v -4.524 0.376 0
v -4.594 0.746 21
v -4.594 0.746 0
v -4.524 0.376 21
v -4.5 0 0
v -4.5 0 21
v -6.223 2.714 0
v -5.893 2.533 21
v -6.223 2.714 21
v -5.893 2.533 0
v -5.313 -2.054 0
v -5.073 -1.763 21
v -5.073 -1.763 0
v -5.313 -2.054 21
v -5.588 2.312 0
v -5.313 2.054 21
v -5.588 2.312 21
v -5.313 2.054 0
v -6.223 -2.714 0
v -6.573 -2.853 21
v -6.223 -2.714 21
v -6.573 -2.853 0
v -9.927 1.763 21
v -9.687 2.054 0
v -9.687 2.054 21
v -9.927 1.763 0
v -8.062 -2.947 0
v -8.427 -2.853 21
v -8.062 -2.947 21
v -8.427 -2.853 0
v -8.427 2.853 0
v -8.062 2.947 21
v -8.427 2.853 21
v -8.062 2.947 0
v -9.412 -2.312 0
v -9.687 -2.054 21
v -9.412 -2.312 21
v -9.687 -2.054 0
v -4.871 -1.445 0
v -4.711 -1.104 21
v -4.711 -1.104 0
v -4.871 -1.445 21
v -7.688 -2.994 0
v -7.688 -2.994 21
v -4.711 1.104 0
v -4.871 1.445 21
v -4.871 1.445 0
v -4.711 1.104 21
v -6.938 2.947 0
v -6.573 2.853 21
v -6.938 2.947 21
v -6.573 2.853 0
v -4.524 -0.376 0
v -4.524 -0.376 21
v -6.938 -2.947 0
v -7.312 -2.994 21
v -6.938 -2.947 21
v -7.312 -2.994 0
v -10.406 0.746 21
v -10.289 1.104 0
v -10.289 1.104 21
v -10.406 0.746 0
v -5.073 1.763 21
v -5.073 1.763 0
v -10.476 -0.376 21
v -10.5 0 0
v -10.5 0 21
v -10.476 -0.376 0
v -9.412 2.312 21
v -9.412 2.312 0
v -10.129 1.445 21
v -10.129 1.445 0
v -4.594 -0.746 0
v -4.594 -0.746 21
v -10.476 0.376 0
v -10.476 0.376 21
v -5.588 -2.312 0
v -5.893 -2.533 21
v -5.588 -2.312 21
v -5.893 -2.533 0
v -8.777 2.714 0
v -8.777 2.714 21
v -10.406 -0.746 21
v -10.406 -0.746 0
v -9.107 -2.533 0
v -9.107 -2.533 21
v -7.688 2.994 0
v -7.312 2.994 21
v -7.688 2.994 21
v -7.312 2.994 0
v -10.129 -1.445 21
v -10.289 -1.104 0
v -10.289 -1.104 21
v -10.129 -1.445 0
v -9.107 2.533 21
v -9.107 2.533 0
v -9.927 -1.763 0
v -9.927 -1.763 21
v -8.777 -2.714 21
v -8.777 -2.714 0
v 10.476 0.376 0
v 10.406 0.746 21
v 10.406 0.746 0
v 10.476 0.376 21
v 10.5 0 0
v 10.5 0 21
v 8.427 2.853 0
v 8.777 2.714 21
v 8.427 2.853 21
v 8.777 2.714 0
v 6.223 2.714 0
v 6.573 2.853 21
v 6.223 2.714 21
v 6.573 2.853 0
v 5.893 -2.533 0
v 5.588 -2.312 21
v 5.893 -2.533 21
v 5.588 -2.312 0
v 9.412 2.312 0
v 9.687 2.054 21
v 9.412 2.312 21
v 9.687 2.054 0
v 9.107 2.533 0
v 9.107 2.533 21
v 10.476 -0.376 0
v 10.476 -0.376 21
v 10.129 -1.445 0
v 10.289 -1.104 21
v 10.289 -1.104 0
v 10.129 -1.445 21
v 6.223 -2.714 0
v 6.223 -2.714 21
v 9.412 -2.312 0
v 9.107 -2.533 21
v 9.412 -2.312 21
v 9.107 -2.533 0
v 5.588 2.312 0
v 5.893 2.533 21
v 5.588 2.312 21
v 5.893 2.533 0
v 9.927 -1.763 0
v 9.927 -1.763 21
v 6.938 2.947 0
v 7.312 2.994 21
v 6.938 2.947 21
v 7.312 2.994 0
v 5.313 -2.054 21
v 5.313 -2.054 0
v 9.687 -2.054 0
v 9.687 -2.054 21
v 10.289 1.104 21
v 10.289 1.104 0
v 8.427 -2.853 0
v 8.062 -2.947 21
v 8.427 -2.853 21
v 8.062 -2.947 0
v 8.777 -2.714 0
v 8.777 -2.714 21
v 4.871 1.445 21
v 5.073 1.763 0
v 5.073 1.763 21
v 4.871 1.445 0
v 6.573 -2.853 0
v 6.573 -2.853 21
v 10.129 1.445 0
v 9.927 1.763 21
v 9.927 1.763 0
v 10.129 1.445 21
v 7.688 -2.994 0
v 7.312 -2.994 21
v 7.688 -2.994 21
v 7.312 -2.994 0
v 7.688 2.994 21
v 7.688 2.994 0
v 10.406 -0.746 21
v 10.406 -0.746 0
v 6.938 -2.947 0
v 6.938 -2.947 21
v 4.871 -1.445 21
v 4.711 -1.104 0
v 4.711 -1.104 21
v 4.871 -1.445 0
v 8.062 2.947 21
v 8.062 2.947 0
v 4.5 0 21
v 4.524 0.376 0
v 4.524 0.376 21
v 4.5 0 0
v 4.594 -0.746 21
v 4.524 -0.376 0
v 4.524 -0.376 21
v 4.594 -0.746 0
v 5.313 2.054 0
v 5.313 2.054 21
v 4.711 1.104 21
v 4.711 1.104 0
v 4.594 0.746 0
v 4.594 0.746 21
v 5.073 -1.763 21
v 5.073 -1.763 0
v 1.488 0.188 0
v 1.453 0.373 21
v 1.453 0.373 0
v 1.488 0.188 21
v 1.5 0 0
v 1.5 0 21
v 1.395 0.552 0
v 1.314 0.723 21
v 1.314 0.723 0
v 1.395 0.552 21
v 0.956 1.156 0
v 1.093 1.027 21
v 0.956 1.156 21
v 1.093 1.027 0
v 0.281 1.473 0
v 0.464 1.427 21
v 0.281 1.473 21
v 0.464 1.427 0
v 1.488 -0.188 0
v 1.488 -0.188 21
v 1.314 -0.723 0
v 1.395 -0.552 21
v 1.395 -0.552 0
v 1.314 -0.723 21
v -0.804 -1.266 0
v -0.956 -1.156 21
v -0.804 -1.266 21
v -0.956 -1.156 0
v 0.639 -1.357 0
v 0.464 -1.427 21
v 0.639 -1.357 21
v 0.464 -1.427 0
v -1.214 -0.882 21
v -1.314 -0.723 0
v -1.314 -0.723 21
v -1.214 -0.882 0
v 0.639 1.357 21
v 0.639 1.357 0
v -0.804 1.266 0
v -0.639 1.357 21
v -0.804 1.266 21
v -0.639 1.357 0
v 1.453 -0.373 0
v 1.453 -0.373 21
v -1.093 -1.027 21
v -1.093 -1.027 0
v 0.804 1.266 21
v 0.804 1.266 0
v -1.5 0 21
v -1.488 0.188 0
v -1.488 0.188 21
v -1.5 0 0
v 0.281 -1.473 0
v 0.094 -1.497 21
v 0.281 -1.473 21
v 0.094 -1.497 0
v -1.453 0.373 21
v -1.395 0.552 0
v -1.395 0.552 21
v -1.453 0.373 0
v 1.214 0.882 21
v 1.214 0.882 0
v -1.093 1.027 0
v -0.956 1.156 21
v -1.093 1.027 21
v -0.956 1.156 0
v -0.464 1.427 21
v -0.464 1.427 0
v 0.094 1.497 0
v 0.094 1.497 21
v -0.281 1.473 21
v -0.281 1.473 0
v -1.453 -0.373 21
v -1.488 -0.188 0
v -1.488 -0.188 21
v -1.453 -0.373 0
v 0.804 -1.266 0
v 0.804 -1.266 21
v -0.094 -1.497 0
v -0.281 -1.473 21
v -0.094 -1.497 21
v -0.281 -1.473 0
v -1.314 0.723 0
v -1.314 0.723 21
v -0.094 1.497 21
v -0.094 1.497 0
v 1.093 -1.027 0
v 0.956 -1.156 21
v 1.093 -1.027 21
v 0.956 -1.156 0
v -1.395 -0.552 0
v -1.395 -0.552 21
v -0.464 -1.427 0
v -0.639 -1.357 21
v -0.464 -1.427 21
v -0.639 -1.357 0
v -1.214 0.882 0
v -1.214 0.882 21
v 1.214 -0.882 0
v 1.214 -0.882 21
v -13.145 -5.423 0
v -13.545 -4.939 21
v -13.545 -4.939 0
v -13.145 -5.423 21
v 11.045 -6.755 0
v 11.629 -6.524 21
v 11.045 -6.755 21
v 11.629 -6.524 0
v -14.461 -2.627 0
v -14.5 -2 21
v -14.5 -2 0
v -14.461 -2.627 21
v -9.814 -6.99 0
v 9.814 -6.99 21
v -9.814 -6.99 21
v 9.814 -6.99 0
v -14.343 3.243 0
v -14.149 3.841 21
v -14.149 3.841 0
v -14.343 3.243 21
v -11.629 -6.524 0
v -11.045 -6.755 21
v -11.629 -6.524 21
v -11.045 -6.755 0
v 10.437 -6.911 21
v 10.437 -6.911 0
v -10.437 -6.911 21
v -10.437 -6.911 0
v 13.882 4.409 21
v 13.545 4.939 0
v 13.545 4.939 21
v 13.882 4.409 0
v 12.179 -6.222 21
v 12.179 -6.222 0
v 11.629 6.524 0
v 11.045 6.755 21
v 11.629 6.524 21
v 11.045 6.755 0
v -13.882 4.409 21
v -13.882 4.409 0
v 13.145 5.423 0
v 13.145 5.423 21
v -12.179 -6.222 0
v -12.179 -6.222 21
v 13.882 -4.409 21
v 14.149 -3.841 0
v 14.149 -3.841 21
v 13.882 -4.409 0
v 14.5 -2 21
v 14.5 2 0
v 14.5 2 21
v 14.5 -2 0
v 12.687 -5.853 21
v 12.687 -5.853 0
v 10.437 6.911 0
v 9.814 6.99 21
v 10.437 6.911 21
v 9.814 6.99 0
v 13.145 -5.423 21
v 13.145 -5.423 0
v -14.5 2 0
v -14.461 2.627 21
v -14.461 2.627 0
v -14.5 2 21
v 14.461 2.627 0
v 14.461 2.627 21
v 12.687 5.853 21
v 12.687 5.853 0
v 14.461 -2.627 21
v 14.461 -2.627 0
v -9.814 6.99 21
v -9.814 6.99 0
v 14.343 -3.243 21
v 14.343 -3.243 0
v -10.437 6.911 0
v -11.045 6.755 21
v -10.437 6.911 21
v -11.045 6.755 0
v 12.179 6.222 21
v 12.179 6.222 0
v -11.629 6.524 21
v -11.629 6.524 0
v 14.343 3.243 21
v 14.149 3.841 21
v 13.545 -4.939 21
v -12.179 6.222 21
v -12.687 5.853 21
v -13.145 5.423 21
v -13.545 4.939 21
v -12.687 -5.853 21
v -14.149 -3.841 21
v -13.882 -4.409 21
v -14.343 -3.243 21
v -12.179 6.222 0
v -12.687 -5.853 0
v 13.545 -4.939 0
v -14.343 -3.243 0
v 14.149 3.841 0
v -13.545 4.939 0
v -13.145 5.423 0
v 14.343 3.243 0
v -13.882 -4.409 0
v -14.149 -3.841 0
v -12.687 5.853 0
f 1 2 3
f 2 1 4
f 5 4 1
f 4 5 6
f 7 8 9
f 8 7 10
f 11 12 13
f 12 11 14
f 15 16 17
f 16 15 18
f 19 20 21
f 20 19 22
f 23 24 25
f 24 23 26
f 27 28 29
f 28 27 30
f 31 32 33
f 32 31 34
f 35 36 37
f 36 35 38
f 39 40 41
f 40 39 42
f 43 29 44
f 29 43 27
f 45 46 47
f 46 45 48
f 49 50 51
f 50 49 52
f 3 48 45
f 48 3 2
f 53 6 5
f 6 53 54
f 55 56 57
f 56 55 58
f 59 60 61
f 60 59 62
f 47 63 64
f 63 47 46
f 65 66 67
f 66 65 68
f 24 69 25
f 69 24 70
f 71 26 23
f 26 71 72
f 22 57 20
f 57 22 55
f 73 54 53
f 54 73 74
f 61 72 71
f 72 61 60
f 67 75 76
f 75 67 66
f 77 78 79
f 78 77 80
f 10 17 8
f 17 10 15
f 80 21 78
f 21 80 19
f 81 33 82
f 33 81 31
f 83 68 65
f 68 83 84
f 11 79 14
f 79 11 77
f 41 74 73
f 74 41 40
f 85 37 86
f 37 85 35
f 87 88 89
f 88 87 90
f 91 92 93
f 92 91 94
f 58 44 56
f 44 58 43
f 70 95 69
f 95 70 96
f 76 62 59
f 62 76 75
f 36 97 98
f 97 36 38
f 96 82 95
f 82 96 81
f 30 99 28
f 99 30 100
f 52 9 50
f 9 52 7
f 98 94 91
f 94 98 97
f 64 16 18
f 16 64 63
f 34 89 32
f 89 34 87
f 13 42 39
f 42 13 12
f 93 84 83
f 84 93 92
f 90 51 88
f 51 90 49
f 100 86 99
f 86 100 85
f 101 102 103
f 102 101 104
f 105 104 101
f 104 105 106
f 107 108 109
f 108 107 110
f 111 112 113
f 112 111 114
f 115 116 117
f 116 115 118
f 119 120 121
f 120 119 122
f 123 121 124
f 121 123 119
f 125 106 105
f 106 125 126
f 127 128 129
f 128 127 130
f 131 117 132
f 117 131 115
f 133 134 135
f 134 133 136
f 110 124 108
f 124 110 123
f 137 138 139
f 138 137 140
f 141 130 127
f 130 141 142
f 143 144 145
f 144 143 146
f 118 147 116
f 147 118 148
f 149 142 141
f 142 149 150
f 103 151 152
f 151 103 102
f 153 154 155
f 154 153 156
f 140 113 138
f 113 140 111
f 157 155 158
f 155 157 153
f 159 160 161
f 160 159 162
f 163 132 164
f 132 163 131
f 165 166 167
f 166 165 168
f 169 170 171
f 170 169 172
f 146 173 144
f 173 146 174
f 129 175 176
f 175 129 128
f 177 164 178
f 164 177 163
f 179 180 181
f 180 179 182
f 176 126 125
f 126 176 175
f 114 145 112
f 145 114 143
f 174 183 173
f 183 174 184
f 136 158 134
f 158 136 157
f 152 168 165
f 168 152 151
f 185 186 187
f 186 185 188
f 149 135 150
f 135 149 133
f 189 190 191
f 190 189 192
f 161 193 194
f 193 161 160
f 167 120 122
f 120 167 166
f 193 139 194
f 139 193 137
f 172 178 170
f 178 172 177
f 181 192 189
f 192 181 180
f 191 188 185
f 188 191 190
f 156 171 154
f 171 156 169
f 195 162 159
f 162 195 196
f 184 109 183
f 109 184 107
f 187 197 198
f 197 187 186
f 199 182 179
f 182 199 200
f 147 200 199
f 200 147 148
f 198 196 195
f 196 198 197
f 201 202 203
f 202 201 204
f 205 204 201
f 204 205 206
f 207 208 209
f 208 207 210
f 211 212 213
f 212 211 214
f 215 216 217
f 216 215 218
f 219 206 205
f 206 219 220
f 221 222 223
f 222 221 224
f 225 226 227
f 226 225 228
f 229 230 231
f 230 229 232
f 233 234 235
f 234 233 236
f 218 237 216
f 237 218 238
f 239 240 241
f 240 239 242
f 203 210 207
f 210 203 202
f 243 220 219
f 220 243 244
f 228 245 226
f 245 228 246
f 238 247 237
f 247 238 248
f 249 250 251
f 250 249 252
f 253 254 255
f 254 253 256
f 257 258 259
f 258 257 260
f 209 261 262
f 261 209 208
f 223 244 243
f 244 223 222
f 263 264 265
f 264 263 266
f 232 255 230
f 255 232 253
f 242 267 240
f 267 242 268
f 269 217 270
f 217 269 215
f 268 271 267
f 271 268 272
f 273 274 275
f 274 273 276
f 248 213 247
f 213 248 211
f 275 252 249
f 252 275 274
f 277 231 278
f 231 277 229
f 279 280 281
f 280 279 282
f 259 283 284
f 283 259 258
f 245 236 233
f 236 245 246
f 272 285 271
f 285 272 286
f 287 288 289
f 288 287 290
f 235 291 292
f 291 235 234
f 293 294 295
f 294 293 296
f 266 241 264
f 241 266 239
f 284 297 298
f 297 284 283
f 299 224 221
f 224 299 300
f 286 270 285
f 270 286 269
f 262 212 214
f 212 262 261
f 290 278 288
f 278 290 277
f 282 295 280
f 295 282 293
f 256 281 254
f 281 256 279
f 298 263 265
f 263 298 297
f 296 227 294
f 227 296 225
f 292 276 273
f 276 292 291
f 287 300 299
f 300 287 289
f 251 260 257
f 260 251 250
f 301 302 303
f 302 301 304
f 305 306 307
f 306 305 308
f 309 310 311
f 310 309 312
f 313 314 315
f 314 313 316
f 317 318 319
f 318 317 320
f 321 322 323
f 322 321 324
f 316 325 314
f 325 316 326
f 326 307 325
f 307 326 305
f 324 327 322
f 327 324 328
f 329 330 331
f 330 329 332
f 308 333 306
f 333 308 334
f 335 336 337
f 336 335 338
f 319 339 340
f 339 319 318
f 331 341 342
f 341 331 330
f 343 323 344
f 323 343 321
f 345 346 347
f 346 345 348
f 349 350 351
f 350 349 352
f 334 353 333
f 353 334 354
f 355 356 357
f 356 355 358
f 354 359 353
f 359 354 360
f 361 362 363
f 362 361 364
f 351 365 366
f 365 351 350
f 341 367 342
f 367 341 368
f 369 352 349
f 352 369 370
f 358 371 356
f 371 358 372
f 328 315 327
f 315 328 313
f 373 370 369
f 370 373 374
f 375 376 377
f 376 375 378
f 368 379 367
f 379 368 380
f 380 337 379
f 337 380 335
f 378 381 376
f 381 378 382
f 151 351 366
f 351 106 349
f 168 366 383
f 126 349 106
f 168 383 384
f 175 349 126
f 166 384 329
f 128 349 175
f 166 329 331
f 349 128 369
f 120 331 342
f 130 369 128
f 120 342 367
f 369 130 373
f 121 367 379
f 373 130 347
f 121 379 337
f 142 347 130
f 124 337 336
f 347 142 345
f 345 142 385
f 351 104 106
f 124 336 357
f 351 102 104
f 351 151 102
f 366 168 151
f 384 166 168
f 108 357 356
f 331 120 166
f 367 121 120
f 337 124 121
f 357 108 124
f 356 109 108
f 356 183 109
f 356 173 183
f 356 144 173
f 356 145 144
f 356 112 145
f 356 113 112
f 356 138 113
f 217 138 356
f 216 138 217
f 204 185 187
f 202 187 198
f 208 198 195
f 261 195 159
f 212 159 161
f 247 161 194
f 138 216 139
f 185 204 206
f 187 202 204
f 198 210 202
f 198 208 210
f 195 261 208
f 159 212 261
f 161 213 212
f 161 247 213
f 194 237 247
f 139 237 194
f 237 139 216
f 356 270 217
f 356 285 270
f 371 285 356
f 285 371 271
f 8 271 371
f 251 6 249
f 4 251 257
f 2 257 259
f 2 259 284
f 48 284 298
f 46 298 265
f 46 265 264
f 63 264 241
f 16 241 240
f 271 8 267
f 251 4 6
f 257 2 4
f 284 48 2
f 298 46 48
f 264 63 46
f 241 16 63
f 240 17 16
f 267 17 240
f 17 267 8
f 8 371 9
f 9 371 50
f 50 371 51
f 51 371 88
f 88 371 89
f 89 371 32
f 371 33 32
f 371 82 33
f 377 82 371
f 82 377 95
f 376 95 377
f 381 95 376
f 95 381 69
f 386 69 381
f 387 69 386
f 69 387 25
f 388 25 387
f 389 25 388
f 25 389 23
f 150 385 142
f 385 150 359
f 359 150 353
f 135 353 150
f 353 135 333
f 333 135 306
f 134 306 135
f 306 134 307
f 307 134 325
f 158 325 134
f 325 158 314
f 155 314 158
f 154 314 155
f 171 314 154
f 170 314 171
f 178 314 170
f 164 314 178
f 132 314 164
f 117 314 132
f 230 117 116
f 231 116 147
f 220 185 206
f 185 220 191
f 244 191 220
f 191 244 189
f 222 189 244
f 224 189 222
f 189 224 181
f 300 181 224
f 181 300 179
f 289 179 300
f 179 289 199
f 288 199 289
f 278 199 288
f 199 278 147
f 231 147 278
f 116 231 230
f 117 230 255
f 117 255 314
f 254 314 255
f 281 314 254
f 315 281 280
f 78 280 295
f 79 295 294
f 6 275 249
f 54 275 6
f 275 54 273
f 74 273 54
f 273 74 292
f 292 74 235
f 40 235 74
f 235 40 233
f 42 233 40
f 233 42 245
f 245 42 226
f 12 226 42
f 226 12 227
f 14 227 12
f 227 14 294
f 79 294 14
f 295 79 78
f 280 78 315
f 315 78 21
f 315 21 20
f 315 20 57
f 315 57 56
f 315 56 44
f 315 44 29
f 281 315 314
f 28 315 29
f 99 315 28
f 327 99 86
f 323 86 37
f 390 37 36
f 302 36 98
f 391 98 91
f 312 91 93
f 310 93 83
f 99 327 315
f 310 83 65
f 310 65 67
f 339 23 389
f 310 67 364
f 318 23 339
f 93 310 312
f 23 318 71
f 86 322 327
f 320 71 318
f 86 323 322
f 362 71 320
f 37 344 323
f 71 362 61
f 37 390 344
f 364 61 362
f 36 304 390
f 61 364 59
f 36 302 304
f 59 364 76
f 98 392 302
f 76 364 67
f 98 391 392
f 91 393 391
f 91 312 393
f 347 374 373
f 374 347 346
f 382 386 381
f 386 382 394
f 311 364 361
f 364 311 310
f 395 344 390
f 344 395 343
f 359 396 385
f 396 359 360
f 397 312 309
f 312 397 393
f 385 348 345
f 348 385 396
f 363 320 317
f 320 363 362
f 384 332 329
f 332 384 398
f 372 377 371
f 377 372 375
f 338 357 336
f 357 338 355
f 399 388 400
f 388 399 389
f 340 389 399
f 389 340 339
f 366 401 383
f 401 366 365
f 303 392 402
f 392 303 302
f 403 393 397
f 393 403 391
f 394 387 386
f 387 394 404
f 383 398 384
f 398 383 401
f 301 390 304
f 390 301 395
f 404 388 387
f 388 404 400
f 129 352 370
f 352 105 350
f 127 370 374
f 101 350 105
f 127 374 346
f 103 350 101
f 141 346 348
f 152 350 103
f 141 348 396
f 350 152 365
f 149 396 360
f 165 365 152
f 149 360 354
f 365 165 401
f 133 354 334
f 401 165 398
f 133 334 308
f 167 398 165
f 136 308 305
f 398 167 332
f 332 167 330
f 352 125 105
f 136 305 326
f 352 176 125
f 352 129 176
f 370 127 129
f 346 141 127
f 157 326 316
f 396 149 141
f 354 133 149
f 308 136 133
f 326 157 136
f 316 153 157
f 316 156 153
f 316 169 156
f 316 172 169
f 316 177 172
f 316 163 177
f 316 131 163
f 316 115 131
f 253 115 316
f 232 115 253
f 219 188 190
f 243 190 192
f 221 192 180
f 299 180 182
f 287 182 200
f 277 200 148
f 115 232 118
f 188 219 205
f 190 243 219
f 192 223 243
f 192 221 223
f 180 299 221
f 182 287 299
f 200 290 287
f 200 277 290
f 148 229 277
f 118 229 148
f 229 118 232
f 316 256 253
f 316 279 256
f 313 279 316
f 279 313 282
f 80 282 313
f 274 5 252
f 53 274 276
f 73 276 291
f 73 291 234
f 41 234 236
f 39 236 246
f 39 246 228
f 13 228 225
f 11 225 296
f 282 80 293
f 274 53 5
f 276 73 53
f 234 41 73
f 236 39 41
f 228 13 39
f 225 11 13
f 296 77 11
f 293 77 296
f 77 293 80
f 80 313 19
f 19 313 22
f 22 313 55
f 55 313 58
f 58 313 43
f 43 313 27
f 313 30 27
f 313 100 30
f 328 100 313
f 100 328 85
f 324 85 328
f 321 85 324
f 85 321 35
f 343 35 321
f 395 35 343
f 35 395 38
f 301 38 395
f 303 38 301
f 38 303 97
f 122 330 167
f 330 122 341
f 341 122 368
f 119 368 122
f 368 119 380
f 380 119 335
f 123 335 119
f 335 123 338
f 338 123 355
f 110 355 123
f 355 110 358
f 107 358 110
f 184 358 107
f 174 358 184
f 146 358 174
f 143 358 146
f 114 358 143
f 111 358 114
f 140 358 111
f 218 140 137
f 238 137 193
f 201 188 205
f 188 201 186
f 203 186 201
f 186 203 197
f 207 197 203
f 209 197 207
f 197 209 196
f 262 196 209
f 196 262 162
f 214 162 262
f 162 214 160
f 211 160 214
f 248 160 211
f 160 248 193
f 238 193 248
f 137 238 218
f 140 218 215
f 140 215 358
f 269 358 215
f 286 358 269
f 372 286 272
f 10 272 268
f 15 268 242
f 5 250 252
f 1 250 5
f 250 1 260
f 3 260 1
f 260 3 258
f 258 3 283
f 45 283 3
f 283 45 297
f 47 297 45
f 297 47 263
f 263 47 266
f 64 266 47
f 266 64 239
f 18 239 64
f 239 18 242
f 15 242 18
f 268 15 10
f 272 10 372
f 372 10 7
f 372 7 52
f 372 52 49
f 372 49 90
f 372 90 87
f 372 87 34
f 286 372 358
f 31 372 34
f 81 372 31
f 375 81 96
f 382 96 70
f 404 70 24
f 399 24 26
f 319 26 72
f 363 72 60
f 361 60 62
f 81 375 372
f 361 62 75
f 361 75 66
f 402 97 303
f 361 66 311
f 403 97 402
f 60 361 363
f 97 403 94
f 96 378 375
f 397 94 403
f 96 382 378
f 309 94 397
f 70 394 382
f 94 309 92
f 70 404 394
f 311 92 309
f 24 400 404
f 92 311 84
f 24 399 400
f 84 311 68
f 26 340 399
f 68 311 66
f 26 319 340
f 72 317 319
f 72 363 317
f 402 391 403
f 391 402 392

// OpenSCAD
$fn = 50;


difference() {
	union() {
		*color(alpha = 1.0000000000, c = "gray") {
			translate(v = [0, 7, 0]) {
				linear_extrude(height = 1) {
					text(font = "Arial:style=Bold", halign = "center", size = 4.5000000000, text = "COMMENT plate main", valign = "center");
				}
			}
		}
		hull() {
			translate(v = [-9.5000000000, 2.0000000000, 0]) {
				cylinder(h = 21, r = 5);
			}
			translate(v = [9.5000000000, 2.0000000000, 0]) {
				cylinder(h = 21, r = 5);
			}
			translate(v = [-9.5000000000, -2.0000000000, 0]) {
				cylinder(h = 21, r = 5);
			}
			translate(v = [9.5000000000, -2.0000000000, 0]) {
				cylinder(h = 21, r = 5);
			}
		}
	}
	union() {
		*color(alpha = 1.0000000000, c = "gray") {
			translate(v = [0, 7, 0]) {
				linear_extrude(height = 1) {
					text(font = "Arial:style=Bold", halign = "center", size = 4.5000000000, text = "COMMENT holes main", valign = "center");
				}
			}
		}
		translate(v = [-7.5000000000, 0.0000000000, 0]) {
			translate(v = [0, 0, -100]) {
				cylinder(h = 200, r = 3.0000000000);
			}
		}
		translate(v = [7.5000000000, 0.0000000000, 0]) {
			translate(v = [0, 0, -100]) {
				cylinder(h = 200, r = 3.0000000000);
			}
		}
		translate(v = [-7.5000000000, 0.0000000000, 0]) {
			translate(v = [0, 0, -100]) {
				cylinder(h = 200, r = 1.5000000000);
			}
		}
		translate(v = [0, 0, -100]) {
			cylinder(h = 200, r = 1.5000000000);
		}
		translate(v = [7.5000000000, 0.0000000000, 0]) {
			translate(v = [0, 0, -100]) {
				cylinder(h = 200, r = 1.5000000000);
			}
		}
	}
}
